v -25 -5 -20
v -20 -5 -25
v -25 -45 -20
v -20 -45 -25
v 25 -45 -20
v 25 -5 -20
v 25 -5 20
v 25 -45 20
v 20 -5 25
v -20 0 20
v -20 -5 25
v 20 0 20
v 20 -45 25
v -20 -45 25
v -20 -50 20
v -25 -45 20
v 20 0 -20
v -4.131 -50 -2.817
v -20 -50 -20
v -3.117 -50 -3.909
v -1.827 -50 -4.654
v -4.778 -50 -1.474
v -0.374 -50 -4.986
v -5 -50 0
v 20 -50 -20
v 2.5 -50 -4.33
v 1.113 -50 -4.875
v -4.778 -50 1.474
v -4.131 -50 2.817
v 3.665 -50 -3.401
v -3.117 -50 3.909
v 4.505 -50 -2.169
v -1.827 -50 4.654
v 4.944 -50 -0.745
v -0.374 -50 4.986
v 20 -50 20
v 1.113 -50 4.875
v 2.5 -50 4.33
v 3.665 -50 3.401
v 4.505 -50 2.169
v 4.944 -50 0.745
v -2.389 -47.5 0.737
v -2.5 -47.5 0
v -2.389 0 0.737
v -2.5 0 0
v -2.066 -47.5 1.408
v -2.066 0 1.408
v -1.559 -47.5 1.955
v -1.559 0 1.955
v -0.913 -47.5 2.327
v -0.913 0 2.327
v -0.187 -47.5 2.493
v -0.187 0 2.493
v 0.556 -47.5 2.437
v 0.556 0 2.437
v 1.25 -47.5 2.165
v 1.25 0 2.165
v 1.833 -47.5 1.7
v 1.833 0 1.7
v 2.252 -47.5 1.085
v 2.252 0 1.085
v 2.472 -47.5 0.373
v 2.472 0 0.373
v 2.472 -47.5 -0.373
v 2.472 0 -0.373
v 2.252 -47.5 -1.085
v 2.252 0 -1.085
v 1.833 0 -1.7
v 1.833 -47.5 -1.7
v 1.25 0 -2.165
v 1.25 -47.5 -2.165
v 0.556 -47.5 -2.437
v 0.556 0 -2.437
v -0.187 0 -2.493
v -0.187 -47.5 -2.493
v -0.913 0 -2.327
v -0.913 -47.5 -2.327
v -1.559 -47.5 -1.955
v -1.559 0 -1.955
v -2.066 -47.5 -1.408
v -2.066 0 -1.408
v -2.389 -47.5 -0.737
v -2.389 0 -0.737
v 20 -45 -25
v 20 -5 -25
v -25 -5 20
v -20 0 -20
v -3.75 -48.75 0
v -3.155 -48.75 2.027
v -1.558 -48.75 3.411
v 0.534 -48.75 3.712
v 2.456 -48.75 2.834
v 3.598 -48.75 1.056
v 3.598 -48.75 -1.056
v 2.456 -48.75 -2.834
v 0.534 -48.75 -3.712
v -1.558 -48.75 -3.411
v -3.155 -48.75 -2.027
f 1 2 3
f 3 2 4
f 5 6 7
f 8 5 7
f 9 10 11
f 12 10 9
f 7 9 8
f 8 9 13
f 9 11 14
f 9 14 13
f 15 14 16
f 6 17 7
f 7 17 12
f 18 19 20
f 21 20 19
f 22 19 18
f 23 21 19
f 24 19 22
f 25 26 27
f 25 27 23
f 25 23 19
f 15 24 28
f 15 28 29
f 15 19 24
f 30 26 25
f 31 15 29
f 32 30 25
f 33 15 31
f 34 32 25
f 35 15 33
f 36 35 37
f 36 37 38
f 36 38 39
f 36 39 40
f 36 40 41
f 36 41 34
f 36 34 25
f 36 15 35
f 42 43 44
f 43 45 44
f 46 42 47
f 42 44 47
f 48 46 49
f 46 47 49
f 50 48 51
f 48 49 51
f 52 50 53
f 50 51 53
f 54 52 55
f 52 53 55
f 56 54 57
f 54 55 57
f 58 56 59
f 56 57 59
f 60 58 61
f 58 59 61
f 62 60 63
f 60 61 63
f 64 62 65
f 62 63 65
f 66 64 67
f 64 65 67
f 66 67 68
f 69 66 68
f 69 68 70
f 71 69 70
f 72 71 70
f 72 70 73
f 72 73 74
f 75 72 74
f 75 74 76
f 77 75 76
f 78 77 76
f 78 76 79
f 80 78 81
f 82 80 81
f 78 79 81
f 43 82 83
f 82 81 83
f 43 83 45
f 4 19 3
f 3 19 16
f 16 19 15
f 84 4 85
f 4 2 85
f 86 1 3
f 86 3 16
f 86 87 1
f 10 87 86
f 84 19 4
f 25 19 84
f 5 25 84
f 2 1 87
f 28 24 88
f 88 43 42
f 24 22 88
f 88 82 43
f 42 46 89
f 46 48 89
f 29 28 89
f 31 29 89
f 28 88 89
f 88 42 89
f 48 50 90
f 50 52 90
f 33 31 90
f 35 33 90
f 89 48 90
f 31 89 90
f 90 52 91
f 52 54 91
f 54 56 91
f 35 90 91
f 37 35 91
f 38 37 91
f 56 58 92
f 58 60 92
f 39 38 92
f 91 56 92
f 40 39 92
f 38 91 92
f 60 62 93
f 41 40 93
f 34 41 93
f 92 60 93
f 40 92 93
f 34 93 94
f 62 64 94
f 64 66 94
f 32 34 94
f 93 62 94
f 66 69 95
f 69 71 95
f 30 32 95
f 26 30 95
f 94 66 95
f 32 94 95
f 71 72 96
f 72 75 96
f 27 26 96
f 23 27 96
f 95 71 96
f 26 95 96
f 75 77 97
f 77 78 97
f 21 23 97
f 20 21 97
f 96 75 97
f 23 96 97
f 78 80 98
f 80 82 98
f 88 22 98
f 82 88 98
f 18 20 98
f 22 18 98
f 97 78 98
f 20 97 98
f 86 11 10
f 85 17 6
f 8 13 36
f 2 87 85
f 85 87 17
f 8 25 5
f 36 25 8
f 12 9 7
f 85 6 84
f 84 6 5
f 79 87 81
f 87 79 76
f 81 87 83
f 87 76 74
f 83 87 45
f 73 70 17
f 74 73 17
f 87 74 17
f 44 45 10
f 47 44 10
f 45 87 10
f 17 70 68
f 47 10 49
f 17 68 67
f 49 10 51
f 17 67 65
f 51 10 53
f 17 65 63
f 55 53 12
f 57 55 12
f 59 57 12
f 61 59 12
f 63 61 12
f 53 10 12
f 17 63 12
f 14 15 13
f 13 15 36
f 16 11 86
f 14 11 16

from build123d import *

# Parameters (mm, degrees)
F0_W           = 50
F0_H           = 50
F1_DEPTH       = 50
F2_SIZE        = 5
F4_D           = 5
F4_CSINK_D     = 10
F4_CSINK_ANGLE = 90


with BuildPart() as f1:
    # F0 (on Front) → F1 (new body)
    with BuildSketch(Plane.XZ):
        Rectangle(F0_W, F0_H)
    extrude(amount=F1_DEPTH)

    # F2
    f2_edges = [f1.edges().sort_by_distance(p)[0] for p in [
        (-25, -25, 25),
        (25, -25, 25),
        (0, -50, 25),
        (0, 0, 25),
        (-25, -50, 0),
        (25, -50, 0),
        (0, -50, -25),
        (-25, -25, -25),
        (-25, 0, 0),
        (0, 0, -25),
        (25, 0, 0),
        (25, -25, -25),
    ]]
    chamfer(f2_edges, length=F2_SIZE)

    # F4 (through all)
    with Locations(Plane.XZ.offset(50)):
        with Locations((0, 0)):
            CounterSinkHole(F4_D / 2, F4_CSINK_D / 2, counter_sink_angle=F4_CSINK_ANGLE)


solid = f1.part
